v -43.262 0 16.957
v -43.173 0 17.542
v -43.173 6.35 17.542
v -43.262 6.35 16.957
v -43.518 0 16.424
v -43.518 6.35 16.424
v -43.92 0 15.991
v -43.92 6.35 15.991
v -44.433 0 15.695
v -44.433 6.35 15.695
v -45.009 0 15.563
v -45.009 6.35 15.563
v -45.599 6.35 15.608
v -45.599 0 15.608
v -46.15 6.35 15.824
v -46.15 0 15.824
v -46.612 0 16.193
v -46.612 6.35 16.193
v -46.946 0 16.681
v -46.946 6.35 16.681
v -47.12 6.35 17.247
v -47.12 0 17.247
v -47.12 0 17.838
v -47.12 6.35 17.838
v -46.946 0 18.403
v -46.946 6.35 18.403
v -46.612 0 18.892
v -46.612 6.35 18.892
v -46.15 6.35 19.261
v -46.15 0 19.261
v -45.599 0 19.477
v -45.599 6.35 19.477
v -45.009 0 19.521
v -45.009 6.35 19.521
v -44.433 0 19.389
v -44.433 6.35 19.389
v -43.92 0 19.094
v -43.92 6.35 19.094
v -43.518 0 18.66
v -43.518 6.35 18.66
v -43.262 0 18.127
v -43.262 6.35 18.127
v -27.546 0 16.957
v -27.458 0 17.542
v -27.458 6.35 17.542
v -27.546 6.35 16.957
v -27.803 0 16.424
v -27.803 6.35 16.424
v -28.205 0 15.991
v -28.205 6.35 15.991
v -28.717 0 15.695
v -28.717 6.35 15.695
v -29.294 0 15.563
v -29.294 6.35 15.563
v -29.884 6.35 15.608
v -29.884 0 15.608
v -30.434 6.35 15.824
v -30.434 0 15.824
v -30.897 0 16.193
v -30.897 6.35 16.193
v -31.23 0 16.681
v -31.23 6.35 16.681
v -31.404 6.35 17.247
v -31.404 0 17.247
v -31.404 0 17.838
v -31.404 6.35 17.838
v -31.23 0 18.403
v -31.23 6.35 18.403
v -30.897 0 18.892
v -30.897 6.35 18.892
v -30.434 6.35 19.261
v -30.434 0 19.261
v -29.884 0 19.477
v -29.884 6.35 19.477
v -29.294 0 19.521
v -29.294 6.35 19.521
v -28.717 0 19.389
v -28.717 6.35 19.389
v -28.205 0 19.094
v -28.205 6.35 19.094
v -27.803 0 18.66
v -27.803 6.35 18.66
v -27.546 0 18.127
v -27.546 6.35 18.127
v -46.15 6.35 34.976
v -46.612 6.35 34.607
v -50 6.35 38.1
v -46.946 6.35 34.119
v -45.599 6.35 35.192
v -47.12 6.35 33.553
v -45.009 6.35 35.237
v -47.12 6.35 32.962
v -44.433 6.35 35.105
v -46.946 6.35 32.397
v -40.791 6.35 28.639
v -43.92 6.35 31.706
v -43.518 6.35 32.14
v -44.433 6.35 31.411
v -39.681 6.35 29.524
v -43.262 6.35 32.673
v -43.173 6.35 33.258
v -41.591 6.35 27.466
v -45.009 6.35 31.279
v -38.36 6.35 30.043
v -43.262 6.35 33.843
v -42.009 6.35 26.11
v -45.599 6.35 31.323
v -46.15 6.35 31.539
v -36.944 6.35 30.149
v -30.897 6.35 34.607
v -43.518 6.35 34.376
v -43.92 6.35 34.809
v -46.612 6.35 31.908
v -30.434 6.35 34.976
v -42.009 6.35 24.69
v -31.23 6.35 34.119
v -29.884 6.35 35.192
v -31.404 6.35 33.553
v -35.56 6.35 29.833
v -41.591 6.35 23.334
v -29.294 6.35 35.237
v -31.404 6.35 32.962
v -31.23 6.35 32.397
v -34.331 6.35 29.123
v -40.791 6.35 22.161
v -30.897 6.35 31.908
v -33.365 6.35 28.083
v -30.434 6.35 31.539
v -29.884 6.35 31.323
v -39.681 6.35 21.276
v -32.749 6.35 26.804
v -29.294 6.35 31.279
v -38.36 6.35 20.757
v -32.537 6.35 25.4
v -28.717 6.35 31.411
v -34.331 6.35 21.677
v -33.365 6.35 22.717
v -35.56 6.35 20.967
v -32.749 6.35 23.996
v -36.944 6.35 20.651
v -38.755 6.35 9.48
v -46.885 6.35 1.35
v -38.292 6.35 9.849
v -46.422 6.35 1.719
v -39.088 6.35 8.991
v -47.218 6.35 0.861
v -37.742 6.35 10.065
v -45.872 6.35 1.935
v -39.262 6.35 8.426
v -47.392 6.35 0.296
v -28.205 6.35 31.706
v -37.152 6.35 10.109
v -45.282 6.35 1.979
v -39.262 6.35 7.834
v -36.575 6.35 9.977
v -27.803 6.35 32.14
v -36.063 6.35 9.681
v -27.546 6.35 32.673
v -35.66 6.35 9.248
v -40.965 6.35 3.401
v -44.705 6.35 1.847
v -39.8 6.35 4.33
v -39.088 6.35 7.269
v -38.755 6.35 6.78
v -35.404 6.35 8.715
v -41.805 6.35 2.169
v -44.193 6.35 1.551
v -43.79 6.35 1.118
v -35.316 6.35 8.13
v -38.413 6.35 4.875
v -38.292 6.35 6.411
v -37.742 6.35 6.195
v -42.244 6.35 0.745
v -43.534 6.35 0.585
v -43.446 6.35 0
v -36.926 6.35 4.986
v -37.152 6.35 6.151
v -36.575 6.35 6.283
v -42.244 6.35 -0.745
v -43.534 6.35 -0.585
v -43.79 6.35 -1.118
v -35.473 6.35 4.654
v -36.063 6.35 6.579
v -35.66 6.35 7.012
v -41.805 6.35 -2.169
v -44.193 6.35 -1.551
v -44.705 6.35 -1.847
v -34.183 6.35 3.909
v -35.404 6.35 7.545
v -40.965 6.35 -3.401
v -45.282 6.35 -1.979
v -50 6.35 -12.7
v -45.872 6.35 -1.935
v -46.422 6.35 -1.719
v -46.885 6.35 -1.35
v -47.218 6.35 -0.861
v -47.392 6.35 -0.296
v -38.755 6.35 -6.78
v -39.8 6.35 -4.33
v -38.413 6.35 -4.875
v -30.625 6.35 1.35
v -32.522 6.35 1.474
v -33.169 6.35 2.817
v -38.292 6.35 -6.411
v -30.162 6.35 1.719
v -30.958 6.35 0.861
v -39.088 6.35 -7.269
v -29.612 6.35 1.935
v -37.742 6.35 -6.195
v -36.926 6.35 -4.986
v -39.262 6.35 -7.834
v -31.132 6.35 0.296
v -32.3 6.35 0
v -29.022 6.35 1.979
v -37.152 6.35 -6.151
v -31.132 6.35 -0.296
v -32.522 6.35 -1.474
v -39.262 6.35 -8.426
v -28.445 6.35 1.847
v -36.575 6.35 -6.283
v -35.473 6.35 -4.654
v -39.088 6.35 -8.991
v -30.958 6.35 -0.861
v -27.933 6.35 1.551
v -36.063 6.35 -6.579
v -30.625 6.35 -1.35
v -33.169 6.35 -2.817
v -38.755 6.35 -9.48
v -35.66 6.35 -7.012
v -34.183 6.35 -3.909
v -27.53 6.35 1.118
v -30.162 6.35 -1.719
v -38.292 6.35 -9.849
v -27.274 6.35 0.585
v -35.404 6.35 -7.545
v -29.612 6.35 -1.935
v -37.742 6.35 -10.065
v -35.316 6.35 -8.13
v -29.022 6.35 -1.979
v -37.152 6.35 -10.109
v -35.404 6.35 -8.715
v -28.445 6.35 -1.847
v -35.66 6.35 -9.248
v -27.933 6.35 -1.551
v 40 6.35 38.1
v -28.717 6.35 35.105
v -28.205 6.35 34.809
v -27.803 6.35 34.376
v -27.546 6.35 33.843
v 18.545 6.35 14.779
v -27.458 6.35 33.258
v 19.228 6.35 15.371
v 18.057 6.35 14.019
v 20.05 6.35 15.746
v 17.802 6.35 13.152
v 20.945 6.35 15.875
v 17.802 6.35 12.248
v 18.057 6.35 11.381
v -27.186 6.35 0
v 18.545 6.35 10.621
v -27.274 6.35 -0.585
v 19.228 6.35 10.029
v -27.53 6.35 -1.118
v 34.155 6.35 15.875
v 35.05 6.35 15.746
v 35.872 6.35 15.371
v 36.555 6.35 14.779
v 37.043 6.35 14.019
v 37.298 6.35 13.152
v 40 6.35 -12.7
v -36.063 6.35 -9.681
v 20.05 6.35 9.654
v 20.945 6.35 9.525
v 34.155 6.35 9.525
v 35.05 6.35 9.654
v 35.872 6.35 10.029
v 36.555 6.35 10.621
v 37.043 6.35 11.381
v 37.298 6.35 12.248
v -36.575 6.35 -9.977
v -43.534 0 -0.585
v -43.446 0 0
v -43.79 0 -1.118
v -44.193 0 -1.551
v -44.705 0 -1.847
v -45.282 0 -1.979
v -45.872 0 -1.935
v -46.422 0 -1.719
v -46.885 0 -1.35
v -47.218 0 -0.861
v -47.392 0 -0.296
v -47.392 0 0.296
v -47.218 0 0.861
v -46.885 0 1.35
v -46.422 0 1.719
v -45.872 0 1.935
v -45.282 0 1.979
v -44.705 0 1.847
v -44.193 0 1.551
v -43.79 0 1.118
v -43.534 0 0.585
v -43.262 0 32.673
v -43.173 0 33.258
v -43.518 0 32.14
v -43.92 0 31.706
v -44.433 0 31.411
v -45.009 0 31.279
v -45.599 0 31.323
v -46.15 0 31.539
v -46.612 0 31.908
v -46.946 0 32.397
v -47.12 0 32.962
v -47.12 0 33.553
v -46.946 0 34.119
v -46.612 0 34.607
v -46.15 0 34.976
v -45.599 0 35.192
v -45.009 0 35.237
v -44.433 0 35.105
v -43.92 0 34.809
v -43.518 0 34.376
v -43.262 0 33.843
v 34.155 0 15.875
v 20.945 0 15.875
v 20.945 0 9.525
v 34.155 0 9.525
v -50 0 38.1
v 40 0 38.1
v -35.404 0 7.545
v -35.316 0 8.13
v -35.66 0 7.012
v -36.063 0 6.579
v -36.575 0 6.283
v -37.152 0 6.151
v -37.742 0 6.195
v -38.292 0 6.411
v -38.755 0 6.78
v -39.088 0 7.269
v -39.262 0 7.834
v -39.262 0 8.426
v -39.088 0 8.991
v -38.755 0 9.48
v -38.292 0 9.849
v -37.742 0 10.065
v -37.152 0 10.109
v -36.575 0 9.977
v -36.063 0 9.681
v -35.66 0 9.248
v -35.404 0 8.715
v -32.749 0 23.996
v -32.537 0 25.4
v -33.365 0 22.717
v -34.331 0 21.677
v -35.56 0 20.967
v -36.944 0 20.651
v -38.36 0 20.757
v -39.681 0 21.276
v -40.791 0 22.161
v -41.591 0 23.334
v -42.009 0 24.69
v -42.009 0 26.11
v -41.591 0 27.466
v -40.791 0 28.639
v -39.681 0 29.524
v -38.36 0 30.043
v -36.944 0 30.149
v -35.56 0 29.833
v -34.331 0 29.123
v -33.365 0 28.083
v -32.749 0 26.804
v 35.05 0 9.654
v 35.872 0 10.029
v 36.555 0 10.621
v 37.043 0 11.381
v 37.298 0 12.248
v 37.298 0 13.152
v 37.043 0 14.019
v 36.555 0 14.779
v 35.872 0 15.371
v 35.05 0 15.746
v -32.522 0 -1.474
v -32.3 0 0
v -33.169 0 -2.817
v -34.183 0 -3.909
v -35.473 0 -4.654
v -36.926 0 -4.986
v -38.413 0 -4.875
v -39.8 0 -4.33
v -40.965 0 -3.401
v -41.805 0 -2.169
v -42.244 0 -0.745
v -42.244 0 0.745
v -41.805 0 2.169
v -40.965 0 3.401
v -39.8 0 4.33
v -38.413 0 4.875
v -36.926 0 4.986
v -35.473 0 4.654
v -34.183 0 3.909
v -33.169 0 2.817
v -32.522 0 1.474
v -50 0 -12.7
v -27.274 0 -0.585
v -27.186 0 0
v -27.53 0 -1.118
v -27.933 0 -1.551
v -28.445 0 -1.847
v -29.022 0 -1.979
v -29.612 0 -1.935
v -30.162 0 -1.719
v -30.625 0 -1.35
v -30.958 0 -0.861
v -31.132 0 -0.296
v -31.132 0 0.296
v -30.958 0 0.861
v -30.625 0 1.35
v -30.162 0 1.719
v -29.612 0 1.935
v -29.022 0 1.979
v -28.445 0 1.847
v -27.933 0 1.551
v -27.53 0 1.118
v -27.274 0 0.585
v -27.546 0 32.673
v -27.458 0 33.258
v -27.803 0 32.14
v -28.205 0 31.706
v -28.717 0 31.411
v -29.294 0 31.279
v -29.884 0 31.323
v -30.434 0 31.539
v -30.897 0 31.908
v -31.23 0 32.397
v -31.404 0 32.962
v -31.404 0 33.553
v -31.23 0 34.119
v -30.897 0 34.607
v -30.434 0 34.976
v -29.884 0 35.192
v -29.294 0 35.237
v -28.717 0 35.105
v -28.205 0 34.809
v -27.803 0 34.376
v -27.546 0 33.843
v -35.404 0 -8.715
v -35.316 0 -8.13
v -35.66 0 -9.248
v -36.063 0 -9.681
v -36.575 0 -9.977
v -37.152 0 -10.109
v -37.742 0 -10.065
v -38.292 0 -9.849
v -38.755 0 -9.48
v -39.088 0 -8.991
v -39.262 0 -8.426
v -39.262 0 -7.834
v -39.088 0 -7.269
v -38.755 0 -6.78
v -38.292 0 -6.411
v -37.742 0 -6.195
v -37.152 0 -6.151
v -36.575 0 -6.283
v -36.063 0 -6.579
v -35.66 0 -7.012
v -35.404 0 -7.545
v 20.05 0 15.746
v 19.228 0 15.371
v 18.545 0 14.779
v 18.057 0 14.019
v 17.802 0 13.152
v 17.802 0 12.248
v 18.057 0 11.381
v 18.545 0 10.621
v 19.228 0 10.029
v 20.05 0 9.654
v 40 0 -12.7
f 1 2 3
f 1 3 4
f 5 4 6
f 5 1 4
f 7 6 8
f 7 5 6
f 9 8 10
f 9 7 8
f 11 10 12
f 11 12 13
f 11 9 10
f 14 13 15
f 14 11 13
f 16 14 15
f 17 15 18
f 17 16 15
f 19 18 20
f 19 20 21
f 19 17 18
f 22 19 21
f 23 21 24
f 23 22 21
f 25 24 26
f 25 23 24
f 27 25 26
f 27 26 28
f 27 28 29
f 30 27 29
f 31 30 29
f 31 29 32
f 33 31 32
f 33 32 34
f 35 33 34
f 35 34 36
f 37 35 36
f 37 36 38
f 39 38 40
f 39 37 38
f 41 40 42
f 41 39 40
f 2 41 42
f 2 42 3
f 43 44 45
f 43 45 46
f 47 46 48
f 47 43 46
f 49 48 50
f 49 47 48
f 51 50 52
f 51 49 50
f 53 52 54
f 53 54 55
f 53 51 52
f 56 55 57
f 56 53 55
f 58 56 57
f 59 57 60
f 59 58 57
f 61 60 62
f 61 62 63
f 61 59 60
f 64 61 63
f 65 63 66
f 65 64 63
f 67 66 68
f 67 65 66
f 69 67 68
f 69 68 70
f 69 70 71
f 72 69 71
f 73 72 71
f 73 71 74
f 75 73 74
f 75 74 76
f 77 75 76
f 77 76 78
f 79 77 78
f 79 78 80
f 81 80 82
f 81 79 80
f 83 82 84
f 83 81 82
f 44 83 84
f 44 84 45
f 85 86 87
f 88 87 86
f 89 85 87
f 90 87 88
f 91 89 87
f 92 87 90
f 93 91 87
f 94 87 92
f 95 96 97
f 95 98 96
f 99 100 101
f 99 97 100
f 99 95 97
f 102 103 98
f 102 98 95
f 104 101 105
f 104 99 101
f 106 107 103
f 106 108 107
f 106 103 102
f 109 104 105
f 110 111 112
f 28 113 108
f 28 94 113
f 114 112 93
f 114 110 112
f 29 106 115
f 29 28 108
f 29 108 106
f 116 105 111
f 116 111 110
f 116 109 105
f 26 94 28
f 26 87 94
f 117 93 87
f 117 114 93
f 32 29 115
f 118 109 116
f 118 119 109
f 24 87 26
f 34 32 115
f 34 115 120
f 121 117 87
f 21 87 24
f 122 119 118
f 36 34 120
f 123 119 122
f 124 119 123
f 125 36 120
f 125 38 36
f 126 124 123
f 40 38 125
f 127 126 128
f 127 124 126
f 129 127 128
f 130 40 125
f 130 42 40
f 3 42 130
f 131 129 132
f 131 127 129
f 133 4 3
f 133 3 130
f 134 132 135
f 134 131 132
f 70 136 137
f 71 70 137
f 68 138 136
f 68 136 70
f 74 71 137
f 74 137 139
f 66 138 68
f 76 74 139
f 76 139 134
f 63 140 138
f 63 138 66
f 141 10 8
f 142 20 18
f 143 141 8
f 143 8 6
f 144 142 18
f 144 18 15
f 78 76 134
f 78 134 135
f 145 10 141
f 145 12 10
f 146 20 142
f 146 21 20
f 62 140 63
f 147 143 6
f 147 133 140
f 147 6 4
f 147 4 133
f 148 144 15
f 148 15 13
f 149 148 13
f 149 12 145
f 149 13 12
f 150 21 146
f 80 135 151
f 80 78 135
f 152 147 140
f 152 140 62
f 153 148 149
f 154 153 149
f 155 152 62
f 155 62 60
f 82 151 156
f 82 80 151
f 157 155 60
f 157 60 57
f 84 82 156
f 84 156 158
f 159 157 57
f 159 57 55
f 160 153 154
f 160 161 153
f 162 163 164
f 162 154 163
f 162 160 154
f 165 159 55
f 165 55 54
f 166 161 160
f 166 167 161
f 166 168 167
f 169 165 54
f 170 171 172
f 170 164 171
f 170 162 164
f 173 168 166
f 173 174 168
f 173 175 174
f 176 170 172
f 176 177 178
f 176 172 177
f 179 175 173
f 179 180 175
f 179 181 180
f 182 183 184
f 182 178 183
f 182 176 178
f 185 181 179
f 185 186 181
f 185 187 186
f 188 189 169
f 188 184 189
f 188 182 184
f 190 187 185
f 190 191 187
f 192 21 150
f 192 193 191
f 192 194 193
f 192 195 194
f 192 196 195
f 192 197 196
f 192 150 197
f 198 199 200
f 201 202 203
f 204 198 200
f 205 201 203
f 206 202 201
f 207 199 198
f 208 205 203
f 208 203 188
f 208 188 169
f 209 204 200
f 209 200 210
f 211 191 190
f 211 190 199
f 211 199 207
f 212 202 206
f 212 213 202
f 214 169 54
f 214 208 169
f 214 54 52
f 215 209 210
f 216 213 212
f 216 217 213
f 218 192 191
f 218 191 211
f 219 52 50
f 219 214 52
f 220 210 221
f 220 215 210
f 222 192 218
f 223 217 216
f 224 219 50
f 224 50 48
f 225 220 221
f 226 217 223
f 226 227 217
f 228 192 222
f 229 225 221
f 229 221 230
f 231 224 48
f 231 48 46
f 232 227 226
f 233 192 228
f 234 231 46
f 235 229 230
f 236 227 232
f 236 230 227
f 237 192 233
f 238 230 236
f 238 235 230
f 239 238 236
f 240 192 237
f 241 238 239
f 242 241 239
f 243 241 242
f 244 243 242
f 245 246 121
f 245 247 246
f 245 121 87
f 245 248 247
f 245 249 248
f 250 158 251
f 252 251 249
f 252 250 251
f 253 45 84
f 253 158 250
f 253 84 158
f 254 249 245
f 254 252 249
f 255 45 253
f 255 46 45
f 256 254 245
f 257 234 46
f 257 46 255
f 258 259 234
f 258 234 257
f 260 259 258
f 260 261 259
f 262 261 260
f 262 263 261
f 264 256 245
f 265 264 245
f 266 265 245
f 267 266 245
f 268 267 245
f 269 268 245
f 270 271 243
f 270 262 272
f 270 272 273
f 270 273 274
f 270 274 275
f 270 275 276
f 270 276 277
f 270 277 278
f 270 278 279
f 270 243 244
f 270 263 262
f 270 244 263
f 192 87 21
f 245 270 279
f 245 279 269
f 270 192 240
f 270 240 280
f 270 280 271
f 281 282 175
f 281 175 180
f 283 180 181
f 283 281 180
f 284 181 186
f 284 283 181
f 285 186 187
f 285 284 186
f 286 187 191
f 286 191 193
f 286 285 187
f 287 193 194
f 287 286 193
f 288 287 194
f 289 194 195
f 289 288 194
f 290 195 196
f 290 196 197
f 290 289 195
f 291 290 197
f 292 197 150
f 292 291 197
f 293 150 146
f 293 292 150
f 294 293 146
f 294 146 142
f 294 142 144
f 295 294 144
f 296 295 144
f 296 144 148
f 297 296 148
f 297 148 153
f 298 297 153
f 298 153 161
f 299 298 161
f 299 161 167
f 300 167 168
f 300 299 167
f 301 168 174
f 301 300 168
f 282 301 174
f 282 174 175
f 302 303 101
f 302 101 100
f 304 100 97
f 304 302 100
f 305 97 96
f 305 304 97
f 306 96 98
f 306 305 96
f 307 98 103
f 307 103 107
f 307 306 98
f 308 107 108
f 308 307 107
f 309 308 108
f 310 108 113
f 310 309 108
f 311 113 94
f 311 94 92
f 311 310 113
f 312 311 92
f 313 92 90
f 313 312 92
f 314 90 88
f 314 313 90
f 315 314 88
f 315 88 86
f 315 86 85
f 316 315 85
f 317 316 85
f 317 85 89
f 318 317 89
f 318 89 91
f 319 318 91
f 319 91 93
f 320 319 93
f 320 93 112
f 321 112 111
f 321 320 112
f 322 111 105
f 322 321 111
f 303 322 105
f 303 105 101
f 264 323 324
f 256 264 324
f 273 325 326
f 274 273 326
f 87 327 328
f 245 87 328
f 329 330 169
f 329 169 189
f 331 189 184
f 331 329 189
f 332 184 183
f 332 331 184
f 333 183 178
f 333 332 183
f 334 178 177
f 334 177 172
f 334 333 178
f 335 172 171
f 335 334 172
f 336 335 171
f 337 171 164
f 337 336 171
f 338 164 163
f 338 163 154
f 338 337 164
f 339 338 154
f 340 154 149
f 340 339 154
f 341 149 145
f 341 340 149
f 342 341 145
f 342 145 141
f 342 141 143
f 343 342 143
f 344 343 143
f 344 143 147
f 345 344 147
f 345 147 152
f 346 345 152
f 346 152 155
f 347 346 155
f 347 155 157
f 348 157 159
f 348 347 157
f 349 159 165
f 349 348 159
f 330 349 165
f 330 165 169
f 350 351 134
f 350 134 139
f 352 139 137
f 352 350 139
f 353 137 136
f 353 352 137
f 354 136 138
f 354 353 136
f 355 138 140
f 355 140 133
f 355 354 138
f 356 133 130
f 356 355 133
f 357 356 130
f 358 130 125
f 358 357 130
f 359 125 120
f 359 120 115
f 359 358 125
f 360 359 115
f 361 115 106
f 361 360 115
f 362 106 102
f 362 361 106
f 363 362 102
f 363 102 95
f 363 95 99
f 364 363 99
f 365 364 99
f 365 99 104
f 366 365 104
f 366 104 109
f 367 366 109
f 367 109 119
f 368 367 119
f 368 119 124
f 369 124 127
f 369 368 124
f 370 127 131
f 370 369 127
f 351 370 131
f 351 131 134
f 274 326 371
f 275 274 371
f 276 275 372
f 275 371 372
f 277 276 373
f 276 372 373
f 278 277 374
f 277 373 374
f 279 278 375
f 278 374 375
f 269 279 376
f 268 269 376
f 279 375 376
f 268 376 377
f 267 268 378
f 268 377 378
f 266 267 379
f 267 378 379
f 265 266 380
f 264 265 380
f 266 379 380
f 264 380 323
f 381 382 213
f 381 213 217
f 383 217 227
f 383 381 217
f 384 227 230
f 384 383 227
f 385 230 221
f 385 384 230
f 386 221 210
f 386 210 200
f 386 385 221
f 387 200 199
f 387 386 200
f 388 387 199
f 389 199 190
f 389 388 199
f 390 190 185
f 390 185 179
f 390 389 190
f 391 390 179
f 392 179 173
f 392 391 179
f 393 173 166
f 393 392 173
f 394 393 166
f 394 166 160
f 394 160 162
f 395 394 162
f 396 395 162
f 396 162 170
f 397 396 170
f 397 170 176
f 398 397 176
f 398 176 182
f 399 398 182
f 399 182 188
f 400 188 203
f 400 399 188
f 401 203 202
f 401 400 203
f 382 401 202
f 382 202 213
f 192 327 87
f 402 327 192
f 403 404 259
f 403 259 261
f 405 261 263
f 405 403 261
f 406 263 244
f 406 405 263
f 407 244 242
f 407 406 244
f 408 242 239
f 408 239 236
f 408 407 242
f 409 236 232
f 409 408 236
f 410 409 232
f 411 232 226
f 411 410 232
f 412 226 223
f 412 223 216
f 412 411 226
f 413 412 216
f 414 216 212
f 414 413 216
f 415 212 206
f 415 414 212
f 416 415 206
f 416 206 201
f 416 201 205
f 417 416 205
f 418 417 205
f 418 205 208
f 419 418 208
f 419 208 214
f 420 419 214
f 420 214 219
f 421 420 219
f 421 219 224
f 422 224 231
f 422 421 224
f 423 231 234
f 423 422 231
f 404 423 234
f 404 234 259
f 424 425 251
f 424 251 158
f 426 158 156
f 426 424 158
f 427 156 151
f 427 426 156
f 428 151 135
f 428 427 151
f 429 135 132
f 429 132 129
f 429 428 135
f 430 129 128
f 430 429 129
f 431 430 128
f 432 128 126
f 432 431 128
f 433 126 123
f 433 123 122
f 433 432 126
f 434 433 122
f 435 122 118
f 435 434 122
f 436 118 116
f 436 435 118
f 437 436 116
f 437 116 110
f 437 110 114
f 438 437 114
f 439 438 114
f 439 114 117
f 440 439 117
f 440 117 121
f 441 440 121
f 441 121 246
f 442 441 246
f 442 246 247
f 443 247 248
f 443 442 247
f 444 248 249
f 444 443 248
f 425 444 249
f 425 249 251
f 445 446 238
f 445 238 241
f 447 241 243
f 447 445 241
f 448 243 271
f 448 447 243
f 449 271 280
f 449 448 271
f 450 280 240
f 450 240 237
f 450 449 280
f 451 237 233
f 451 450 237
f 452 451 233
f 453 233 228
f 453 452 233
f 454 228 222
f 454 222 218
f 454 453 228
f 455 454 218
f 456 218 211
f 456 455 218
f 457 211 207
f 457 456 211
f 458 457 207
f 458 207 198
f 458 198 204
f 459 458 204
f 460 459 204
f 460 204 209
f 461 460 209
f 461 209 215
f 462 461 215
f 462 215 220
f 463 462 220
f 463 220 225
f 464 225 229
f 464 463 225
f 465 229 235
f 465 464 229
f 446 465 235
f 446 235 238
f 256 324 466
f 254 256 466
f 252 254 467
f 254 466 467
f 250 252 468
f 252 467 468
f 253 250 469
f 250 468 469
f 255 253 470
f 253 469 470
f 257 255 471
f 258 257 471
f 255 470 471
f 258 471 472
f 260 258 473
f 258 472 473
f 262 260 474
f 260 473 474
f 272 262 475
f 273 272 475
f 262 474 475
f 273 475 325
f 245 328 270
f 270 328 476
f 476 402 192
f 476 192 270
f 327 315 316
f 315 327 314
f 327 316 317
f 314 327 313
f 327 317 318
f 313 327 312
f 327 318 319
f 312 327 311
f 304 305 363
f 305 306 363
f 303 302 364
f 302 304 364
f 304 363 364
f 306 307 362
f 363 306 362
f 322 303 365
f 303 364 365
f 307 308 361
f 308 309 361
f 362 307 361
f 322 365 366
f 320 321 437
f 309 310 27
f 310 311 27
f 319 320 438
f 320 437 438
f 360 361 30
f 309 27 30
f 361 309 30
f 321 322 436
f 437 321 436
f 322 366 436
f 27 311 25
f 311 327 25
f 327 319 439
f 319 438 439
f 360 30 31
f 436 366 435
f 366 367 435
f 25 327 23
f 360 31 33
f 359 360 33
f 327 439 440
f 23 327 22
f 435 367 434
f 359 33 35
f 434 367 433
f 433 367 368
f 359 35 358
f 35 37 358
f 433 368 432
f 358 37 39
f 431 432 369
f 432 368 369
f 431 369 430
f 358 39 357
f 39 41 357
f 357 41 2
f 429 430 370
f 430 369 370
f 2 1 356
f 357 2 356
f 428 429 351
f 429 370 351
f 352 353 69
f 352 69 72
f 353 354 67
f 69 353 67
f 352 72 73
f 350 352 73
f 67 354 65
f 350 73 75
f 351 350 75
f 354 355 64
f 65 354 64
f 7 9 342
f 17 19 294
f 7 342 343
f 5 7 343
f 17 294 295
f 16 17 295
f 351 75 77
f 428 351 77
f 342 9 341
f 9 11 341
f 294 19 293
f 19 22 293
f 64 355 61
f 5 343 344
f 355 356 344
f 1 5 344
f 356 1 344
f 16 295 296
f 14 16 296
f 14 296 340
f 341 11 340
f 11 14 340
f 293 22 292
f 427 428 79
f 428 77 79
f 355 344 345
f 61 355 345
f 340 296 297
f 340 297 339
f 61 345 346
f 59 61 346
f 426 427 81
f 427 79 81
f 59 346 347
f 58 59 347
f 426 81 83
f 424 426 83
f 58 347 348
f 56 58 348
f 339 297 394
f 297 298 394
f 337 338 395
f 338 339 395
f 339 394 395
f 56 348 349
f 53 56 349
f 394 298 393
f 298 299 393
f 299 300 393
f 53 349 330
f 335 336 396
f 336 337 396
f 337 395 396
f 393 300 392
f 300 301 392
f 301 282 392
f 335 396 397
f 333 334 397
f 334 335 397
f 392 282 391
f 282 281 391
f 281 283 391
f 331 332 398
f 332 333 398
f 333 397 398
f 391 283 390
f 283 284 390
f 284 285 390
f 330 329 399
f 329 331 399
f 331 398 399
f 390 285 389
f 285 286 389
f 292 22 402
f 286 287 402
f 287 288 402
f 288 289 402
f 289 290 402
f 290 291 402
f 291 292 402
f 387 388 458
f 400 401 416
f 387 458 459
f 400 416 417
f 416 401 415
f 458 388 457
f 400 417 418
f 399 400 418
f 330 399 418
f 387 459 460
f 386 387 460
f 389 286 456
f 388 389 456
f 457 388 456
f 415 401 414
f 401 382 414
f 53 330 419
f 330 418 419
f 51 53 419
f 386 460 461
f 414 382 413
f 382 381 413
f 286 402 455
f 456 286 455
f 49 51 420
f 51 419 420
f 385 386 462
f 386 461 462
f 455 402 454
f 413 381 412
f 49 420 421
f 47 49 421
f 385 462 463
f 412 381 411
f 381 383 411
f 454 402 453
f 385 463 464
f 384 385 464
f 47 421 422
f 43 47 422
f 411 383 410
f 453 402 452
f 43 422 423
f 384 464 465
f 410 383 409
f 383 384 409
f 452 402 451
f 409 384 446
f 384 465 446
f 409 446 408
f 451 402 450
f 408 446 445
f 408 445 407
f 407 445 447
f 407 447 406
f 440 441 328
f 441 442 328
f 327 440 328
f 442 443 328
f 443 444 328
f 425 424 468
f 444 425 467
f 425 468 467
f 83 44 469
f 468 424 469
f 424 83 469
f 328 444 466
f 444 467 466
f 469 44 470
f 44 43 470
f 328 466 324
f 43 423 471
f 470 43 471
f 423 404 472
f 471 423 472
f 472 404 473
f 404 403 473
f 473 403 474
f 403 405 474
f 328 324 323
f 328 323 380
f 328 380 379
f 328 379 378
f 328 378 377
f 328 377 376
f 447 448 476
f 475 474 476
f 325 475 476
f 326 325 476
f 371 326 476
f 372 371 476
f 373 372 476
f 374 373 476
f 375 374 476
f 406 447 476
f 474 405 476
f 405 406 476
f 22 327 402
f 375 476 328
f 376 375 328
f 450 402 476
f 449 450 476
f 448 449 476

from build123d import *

# Parameters (mm, degrees)
SKETCH1_W           = 90
SKETCH1_H           = 50.8
SKETCH1_R           = 5
SKETCH1_R_2         = 1.984375
SKETCH1_R_3         = 4.7625
BOSS_EXTRUDE1_DEPTH = 6.35


with BuildPart() as part:
    # Sketch1 → Boss-Extrude1 (new body)
    with BuildSketch(Plane(origin=(0, 0, 0), x_dir=(1, 0, 0), z_dir=(0, 1, 0))):
        with Locations((-5, -12.7)):
            Rectangle(SKETCH1_W, SKETCH1_H)
        with Locations((-37.3, 0)):
            Circle(SKETCH1_R, mode=Mode.SUBTRACT)
        with Locations((-37.3, -8.13)):
            Circle(SKETCH1_R_2, mode=Mode.SUBTRACT)
        with Locations((-45.43, 0)):
            Circle(SKETCH1_R_2, mode=Mode.SUBTRACT)
        with Locations((-37.3, 8.13)):
            Circle(SKETCH1_R_2, mode=Mode.SUBTRACT)
        with Locations((-29.17, 0)):
            Circle(SKETCH1_R_2, mode=Mode.SUBTRACT)
        with Locations((-37.3, -25.4)):
            Circle(SKETCH1_R_3, mode=Mode.SUBTRACT)
        with Locations((-45.157724106, -17.542275894)):
            Circle(SKETCH1_R_2, mode=Mode.SUBTRACT)
        with Locations((-29.442275894, -17.542275894)):
            Circle(SKETCH1_R_2, mode=Mode.SUBTRACT)
        with Locations((-29.442275894, -33.257724106)):
            Circle(SKETCH1_R_2, mode=Mode.SUBTRACT)
        with Locations((-45.157724106, -33.257724106)):
            Circle(SKETCH1_R_2, mode=Mode.SUBTRACT)
        with BuildLine():
            Line((20.945, -9.525), (34.155, -9.525))
            ThreePointArc((34.155, -9.525), (37.33, -12.7), (34.155, -15.875))
            Line((34.155, -15.875), (20.945, -15.875))
            ThreePointArc((20.945, -15.875), (17.77, -12.7), (20.945, -9.525))
        make_face(mode=Mode.SUBTRACT)
    extrude(amount=BOSS_EXTRUDE1_DEPTH)


solid = part.part
